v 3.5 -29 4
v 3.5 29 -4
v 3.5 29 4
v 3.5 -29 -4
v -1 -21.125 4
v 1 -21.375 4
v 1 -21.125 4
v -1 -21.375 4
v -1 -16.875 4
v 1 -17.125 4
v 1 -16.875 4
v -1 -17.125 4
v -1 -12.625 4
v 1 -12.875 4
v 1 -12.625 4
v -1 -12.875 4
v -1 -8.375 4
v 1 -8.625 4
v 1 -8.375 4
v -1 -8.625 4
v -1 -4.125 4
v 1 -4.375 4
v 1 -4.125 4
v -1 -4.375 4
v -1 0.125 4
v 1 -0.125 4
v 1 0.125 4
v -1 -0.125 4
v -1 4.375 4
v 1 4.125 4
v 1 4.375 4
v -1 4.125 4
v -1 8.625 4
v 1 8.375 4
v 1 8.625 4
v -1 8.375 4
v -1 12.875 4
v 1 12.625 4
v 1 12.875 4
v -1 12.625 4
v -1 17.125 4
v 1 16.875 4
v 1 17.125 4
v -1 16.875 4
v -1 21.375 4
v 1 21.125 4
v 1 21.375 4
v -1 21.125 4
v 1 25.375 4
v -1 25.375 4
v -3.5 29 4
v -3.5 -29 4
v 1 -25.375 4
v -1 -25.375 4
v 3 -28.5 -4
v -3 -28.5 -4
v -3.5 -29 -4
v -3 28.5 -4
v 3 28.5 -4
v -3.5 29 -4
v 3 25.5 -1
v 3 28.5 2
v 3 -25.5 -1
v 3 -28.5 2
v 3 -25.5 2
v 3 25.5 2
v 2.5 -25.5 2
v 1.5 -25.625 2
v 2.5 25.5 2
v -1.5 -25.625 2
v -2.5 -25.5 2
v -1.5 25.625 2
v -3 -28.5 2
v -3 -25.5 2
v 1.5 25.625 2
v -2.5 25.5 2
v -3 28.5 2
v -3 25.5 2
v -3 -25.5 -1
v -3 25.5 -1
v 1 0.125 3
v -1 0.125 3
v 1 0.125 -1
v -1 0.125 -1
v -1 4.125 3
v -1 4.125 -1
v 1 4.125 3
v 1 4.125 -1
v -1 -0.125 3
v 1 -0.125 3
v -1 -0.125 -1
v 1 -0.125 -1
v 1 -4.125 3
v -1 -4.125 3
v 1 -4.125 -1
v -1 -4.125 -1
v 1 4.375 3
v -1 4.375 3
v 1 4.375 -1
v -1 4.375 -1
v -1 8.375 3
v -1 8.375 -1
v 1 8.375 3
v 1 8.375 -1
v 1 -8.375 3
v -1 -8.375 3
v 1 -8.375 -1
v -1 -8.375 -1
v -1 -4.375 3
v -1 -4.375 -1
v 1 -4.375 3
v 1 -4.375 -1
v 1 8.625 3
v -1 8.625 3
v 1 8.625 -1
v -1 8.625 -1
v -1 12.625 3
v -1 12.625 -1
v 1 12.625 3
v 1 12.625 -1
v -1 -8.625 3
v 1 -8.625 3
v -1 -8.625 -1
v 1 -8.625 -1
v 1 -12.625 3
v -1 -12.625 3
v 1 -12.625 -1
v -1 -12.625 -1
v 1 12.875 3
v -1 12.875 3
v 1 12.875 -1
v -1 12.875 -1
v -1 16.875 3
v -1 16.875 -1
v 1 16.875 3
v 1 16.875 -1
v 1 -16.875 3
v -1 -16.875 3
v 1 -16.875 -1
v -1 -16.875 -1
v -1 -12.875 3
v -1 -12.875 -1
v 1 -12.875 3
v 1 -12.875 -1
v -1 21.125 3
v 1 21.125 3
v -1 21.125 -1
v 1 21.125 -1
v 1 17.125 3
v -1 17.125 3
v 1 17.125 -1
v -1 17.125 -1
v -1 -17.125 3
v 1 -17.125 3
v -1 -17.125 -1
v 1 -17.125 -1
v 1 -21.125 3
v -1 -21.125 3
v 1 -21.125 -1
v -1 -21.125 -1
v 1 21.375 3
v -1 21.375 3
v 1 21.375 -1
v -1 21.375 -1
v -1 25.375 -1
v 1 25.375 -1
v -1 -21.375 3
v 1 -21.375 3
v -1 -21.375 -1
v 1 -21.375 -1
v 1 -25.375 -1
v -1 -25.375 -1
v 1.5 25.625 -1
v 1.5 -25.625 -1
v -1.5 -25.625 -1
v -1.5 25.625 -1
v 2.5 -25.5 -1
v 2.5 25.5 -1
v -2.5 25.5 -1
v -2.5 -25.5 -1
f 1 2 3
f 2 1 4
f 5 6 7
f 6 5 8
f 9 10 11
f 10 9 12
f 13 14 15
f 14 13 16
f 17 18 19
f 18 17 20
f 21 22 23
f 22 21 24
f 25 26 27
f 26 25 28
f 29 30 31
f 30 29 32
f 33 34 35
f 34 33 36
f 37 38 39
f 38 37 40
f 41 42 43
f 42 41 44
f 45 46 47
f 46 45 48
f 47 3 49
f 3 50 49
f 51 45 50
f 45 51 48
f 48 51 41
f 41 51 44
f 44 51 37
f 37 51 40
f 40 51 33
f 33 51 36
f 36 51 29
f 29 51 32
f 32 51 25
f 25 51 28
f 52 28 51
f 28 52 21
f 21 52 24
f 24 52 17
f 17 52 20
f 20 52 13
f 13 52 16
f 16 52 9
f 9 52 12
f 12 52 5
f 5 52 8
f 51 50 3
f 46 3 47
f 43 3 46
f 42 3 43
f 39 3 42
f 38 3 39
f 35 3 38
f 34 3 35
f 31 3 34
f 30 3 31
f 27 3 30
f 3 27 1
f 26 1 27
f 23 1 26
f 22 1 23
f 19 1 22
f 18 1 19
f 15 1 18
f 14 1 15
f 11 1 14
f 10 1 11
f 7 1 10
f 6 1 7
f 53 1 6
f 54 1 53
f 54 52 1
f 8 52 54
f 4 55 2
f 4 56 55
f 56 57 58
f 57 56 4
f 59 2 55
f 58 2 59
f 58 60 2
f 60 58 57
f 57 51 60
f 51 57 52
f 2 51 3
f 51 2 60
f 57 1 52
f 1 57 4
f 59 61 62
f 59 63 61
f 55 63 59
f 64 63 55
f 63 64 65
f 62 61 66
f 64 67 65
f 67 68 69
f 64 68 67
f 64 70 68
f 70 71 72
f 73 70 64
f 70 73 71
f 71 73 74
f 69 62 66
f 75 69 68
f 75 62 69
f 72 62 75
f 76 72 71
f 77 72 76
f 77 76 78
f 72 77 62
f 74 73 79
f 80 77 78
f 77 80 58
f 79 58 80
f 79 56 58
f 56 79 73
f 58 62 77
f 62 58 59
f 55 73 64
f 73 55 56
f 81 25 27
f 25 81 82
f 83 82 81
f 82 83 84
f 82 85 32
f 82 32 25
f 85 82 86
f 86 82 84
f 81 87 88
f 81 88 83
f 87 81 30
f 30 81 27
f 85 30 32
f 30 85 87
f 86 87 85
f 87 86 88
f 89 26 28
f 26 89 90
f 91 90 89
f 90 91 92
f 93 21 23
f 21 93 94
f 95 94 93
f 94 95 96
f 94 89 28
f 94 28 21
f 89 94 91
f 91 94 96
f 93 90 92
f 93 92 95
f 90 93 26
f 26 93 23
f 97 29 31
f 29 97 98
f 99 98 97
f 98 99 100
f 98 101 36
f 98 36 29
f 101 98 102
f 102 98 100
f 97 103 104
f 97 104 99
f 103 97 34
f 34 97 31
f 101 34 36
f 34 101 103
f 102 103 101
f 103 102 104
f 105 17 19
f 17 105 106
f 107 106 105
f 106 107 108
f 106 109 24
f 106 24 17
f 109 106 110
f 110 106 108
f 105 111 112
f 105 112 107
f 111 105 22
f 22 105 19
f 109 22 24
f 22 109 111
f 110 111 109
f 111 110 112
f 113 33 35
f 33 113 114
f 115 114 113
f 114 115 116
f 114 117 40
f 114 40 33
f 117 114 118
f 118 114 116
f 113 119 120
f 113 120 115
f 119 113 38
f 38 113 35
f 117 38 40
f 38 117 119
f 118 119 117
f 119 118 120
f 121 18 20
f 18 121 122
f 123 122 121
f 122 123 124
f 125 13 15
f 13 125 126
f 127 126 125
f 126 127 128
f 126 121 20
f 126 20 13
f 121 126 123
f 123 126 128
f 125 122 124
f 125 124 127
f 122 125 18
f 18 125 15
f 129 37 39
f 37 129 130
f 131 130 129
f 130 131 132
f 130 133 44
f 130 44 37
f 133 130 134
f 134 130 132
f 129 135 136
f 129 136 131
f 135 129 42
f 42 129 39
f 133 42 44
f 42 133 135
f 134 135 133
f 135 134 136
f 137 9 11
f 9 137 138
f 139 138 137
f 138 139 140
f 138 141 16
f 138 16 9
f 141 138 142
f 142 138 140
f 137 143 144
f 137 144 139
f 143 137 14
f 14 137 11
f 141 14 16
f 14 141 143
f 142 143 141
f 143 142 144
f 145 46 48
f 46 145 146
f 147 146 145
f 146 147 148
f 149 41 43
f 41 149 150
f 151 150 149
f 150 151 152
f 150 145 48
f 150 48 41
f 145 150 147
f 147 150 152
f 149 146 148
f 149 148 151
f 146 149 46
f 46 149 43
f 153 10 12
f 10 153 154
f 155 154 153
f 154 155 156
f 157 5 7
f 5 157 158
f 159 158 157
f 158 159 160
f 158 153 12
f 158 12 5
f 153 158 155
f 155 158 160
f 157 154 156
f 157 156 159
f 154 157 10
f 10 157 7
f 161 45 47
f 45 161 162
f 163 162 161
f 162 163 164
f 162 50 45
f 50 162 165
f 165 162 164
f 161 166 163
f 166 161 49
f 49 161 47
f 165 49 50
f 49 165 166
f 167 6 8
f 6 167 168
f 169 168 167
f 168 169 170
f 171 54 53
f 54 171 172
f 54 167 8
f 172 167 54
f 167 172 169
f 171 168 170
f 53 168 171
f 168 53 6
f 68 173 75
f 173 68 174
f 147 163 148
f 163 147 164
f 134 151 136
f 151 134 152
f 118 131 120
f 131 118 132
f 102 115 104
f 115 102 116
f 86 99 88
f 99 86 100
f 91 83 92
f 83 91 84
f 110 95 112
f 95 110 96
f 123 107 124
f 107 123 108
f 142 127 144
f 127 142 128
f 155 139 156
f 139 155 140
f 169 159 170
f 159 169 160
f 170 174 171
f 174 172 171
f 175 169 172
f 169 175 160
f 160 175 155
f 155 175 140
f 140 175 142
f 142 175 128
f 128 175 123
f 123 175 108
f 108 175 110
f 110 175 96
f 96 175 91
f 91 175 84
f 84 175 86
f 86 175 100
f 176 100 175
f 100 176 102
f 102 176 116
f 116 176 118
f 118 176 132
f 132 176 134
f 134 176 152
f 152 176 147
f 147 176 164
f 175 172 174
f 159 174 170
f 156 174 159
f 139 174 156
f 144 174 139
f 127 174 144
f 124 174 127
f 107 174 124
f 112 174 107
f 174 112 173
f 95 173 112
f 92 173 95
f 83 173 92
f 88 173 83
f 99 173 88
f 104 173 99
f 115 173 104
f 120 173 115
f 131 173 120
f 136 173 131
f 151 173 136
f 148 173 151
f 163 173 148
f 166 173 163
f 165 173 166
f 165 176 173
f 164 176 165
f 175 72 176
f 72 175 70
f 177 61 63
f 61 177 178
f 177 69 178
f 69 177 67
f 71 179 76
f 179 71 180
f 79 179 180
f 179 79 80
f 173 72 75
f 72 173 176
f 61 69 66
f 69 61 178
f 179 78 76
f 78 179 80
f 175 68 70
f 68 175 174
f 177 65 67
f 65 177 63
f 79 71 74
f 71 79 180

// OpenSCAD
$fn=50;
$t=true;        //Abbreviation
$wth=1;         //Wall Thickness
$l=58;          //Length
$w=7;           //Width
$h=8;           //Height
$ow=4;          //LED Opening Width
$oiw=3.5;       //LED Opening Inside Width
$ol=2;          //LED Opening length
$os=.25;        //LED Opening Spacing
$ols=$ow+$os;   //Distance per LED
$olso=$ols/2;   //Offset for Center
$od=4;          //LED Opening Depth

module ledopening() {
    rotate([0,0,90]) cube([$ow,$ol,$wth*4], center=$t);
}

module ledconduit() {
    difference() {
        cube([$ol+1, $ow+$os*2, $h/2], center=$t);
        cube([$ol, $ow, $h/2], center=$t);
    }
    translate([($w/2)-$wth+.25,0,0]) cube([.5,$ols,$h/2], center=$t);
    translate([-($w/2)+$wth-.25,0,0]) cube([.5,$ols,$h/2], center=$t);
}

difference() {
    cube([$w,$l,$h], center=$t);
    translate([0,0,-$wth*2]) cube([$w-$wth,$l-$wth,$h], center=$t);
    translate([0,$olso,$h/2]) ledopening();         //LED #6
    translate([0,-$olso,$h/2]) ledopening();        //LED #7
    translate([0,$olso+$ols,$h/2]) ledopening();    //LED #5
    translate([0,-$olso-$ols,$h/2]) ledopening();   //LED #8
    translate([0,$olso+$ols*2,$h/2]) ledopening();  //LED #4
    translate([0,-$olso-$ols*2,$h/2]) ledopening(); //LED #9
    translate([0,$olso+$ols*3,$h/2]) ledopening();  //LED #3
    translate([0,-$olso-$ols*3,$h/2]) ledopening(); //LED #10
    translate([0,$olso+$ols*4,$h/2]) ledopening();  //LED #2
    translate([0,-$olso-$ols*4,$h/2]) ledopening(); //LED #11
    translate([0,$olso+$ols*5,$h/2]) ledopening();  //LED #1
    translate([0,-$olso-$ols*5,$h/2]) ledopening(); //LED #12
}
//translate([0,$olso,$h]) ledconduit();
translate([0,$olso,1]) ledconduit();                //LED Conduit #6
translate([0,-$olso,1]) ledconduit();               //LED Conduit #7
translate([0,$olso+$ols,1]) ledconduit();           //LED Conduit #5
translate([0,-$olso-$ols,1]) ledconduit();          //LED Conduit #8
translate([0,$olso+$ols*2,1]) ledconduit();         //LED Conduit #4
translate([0,-$olso-$ols*2,1]) ledconduit();        //LED Conduit #9
translate([0,$olso+$ols*3,1]) ledconduit();         //LED Conduit #3
translate([0,-$olso-$ols*3,1]) ledconduit();        //LED Conduit #10
translate([0,$olso+$ols*4,1]) ledconduit();         //LED Conduit #2
translate([0,-$olso-$ols*4,1]) ledconduit();        //LED Conduit #11
translate([0,$olso+$ols*5,1]) ledconduit();         //LED Conduit #1
translate([0,-$olso-$ols*5,1]) ledconduit();        //LED Conduit #12
